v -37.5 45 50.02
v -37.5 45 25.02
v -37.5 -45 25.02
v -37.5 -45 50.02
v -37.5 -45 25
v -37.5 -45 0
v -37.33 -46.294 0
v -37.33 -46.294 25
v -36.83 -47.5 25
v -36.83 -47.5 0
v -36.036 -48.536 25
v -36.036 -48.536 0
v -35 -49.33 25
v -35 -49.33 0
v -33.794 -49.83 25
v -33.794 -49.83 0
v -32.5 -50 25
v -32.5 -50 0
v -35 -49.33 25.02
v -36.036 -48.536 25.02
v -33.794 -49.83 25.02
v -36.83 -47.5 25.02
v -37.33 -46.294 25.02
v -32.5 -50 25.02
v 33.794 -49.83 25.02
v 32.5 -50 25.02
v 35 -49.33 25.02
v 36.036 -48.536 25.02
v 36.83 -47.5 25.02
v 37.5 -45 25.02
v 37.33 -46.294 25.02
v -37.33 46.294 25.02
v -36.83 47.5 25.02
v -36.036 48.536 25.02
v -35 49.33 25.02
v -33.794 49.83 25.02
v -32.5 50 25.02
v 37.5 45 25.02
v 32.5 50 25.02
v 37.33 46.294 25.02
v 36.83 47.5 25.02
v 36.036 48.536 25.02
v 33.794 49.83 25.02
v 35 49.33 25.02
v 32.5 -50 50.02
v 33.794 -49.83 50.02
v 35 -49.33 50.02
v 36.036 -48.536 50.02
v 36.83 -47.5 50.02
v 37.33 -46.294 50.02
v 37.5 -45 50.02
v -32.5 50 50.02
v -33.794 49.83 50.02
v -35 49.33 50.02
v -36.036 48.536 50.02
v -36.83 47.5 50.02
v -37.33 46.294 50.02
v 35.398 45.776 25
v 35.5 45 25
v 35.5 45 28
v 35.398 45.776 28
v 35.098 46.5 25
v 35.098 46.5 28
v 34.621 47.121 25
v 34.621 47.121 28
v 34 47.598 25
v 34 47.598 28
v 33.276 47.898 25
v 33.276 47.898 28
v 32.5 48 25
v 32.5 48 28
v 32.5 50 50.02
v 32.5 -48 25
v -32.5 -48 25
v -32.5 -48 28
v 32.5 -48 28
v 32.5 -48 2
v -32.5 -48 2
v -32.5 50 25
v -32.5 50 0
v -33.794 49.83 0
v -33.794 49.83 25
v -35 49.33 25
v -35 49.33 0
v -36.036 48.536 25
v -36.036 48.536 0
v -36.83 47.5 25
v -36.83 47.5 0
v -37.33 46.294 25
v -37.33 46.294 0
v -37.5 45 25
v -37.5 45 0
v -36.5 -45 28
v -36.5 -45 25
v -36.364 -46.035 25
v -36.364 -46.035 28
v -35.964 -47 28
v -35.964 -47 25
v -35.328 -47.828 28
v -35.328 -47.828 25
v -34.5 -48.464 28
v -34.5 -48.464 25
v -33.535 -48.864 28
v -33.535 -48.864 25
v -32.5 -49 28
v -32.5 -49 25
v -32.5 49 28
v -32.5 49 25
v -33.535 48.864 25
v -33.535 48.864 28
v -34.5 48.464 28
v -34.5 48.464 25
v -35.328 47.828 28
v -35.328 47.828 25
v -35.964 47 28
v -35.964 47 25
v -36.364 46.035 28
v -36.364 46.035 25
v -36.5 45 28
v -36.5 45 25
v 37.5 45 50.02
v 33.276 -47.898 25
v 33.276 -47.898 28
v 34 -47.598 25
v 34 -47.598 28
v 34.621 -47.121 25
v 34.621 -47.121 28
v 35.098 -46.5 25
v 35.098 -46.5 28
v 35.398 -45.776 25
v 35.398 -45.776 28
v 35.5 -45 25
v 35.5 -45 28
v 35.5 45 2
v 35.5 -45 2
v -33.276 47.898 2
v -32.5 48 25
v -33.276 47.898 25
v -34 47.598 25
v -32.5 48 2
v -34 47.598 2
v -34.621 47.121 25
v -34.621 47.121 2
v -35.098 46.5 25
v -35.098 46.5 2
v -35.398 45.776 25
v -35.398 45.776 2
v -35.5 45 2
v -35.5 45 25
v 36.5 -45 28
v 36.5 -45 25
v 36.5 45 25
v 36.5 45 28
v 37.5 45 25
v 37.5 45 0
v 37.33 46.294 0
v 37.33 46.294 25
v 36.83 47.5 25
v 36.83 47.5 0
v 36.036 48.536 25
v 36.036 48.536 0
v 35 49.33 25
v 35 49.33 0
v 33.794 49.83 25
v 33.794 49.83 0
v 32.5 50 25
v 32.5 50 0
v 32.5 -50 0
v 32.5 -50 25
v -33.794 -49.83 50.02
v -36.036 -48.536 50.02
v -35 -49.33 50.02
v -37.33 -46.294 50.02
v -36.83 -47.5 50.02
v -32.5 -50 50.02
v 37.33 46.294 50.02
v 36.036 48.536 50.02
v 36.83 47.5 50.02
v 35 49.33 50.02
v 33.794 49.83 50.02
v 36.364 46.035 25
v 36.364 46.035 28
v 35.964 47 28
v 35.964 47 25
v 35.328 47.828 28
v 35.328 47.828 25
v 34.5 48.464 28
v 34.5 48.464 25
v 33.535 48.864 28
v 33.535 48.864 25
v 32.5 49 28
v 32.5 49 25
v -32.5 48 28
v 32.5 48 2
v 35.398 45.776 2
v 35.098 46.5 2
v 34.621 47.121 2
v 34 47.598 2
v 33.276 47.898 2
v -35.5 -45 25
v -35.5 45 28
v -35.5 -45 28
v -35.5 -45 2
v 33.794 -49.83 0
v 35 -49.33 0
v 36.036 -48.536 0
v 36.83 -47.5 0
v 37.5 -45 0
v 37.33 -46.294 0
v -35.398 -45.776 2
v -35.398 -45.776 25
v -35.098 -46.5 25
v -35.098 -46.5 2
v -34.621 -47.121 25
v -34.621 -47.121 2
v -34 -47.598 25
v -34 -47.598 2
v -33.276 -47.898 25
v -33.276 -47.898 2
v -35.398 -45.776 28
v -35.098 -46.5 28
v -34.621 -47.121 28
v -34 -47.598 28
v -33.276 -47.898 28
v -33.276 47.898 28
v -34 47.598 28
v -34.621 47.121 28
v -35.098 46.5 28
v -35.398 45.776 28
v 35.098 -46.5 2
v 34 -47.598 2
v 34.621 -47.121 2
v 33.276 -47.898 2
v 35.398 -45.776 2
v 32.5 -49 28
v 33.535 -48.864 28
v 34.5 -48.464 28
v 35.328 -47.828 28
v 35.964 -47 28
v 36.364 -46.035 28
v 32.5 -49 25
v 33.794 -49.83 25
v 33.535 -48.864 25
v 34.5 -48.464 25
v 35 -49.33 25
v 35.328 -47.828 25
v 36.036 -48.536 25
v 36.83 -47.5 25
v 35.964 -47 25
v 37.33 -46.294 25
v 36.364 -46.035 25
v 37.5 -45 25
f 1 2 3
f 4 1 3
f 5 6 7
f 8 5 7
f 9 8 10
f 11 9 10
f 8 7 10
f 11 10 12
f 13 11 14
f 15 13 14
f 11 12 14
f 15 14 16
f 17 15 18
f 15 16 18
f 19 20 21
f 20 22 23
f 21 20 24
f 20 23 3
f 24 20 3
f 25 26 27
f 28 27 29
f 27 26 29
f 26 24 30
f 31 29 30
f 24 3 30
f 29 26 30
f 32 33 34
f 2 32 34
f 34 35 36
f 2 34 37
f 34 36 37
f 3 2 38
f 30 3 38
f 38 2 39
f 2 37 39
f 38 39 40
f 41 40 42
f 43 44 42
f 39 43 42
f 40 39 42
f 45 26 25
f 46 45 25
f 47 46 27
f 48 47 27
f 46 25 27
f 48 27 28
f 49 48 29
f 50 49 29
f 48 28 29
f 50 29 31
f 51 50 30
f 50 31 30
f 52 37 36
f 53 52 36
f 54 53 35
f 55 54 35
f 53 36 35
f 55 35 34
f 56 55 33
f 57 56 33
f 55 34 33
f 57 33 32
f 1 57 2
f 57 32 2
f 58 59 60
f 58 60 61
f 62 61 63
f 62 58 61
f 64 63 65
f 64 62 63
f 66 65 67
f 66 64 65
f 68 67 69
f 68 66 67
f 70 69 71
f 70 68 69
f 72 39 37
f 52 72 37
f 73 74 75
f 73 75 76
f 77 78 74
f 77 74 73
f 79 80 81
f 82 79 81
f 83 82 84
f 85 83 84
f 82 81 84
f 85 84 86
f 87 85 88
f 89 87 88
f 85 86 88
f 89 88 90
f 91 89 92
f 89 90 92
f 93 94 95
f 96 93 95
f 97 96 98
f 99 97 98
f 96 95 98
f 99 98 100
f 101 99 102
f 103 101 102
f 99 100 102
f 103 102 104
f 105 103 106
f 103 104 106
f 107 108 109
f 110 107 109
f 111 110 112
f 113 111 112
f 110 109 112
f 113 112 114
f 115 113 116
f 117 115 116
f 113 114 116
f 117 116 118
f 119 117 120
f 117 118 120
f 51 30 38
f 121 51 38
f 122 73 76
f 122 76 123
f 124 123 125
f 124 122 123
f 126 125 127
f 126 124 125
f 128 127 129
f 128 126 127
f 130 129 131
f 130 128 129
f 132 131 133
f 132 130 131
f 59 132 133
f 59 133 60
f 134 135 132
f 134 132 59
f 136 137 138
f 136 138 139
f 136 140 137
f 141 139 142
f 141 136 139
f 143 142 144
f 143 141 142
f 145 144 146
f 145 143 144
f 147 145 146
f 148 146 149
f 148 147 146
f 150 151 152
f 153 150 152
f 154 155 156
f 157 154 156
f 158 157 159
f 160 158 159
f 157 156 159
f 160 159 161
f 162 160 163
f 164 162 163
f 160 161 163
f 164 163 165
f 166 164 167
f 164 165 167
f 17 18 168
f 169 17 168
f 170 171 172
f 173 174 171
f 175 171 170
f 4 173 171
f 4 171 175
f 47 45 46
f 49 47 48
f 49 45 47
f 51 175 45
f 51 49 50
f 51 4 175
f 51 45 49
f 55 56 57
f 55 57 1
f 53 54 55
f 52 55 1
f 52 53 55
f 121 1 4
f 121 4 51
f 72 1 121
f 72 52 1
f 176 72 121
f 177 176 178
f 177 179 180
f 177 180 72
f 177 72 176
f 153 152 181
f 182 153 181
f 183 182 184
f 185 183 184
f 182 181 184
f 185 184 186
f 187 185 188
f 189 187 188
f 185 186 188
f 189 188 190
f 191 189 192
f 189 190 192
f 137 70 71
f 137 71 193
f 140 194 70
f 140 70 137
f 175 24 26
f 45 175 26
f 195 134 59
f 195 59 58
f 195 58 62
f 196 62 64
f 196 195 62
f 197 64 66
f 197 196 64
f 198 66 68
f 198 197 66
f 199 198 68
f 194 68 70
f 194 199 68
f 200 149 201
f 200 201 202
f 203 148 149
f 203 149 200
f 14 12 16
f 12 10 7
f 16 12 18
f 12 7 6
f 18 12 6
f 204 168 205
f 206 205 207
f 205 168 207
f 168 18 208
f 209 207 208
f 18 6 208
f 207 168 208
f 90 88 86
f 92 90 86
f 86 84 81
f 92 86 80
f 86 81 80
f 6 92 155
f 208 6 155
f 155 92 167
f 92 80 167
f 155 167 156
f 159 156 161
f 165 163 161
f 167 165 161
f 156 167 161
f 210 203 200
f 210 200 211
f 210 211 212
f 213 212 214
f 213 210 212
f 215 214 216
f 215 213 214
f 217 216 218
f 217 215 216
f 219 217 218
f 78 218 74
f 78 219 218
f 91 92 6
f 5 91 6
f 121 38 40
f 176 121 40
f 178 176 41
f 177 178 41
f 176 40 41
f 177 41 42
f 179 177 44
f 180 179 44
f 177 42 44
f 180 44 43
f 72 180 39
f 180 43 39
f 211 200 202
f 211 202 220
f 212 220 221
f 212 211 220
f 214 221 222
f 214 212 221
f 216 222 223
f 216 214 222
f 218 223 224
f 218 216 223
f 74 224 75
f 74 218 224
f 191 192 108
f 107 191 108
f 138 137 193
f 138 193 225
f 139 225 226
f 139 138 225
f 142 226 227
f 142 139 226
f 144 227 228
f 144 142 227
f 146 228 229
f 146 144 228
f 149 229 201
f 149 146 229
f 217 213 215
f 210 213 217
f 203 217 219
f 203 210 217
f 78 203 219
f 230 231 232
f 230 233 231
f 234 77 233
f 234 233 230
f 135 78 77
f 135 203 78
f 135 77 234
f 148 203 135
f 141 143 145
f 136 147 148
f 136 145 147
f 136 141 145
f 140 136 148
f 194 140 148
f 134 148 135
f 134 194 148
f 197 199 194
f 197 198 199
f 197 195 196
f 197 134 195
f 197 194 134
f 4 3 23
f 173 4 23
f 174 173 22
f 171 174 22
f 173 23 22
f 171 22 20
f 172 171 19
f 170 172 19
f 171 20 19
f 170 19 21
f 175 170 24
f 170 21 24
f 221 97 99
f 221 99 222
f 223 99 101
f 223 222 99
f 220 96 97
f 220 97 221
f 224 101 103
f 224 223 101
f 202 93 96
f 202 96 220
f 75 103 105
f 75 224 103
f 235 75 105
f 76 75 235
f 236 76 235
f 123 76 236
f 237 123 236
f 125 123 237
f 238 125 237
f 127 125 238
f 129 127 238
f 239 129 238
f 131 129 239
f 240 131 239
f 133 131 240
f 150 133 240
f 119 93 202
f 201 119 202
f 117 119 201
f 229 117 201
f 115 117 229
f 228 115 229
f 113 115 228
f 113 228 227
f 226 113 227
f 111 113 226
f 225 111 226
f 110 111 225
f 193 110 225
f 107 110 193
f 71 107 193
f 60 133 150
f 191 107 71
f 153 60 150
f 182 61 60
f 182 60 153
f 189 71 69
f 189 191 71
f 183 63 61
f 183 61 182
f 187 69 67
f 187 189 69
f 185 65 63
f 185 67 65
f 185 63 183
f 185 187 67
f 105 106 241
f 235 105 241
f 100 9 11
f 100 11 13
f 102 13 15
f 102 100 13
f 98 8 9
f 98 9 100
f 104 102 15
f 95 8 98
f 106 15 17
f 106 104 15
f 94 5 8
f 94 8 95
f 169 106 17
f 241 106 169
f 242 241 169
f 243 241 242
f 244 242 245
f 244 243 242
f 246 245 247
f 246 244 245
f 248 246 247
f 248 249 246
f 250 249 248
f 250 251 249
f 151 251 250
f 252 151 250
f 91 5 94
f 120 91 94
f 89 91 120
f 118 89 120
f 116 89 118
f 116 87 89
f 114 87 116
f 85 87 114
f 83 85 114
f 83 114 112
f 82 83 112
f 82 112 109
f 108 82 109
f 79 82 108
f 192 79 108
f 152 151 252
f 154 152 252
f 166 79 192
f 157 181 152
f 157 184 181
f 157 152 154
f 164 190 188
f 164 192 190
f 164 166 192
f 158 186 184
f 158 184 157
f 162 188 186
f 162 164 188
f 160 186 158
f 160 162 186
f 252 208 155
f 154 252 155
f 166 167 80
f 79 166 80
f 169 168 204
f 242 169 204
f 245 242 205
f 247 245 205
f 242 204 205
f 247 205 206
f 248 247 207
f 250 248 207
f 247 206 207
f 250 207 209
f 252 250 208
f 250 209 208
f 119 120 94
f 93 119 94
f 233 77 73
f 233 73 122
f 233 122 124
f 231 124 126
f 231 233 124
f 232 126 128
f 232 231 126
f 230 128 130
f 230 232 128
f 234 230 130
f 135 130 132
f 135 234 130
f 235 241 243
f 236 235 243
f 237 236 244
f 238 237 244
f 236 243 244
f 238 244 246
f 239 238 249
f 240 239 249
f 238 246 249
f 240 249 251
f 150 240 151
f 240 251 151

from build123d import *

# Parameters (mm, degrees)
PAD_DEPTH    = 25
THICKNESS_T  = -2
PAD001_DEPTH = 3
PAD002_DEPTH = 25
POCKET_DEPTH = 3


with BuildPart() as body:
    # Sketch → Pad (new body)
    with BuildSketch(Plane.XY):
        with BuildLine():
            Line((-37.5, 45), (-37.5, -45))
            ThreePointArc((-37.5, -45), (-36.035534, -48.535534), (-32.5, -50))
            Line((-32.5, -50), (32.5, -50))
            ThreePointArc((32.5, -50), (36.035534, -48.535534), (37.5, -45))
            Line((37.5, -45), (37.5, 45))
            ThreePointArc((37.5, 45), (36.035534, 48.535534), (32.5, 50))
            Line((32.5, 50), (-32.5, 50))
            ThreePointArc((-32.5, 50), (-36.035534, 48.535534), (-37.5, 45))
        make_face()
    extrude(amount=PAD_DEPTH)

    # Thickness
    thickness_openings = [body.faces().sort_by_distance(p)[0] for p in [
        (0, 0, 25),
    ]]
    offset(amount=THICKNESS_T, openings=thickness_openings)

    # Sketch001 (on Face10 of Thickness) → Pad001 (join)
    with BuildSketch(Plane.XY.offset(25)):
        with BuildLine():
            Line((-36.5, 45), (-36.5, -45))
            ThreePointArc((-36.5, -45), (-35.328427, -47.828427), (-32.5, -49))
            Line((-32.5, -49), (32.5, -49))
            ThreePointArc((32.5, -49), (35.328427, -47.828427), (36.5, -45))
            Line((36.5, -45), (36.5, 45))
            ThreePointArc((36.5, 45), (35.328427, 47.828427), (32.5, 49))
            Line((32.5, 49), (-32.5, 49))
            ThreePointArc((-32.5, 49), (-35.328427, 47.828427), (-36.5, 45))
        make_face()
        with BuildLine():
            Line((-35.5, 45), (-35.5, -45))
            ThreePointArc((-35.5, -45), (-34.62132, -47.12132), (-32.5, -48))
            Line((-32.5, -48), (32.5, -48))
            ThreePointArc((32.5, -48), (34.62132, -47.12132), (35.5, -45))
            Line((35.5, -45), (35.5, 45))
            ThreePointArc((35.5, 45), (34.62132, 47.12132), (32.5, 48))
            Line((32.5, 48), (-32.5, 48))
            ThreePointArc((-32.5, 48), (-34.62132, 47.12132), (-35.5, 45))
        make_face(mode=Mode.SUBTRACT)
    extrude(amount=PAD001_DEPTH)


with BuildPart() as lid:
    # Sketch002 → Pad002 (new body)
    with BuildSketch(Plane.XY.offset(25.02)):
        with BuildLine():
            Line((-37.5, 45), (-37.5, -45))
            ThreePointArc((-37.5, -45), (-36.035534, -48.535534), (-32.5, -50))
            Line((-32.5, -50), (32.5, -50))
            ThreePointArc((32.5, -50), (36.035534, -48.535534), (37.5, -45))
            Line((37.5, -45), (37.5, 45))
            ThreePointArc((37.5, 45), (36.035534, 48.535534), (32.5, 50))
            Line((32.5, 50), (-32.5, 50))
            ThreePointArc((-32.5, 50), (-36.035534, 48.535534), (-37.5, 45))
        make_face()
    extrude(amount=PAD002_DEPTH)

    # Sketch003 (on Face4 of Binder) → Pocket (cut)
    with BuildSketch(Plane(origin=(0, 0, 0), x_dir=(1, 0, 0), z_dir=(0, 0, -1))):
        with BuildLine():
            Line((-36.6, 45), (-36.6, -45))
            ThreePointArc((-36.6, -45), (-35.399138, -47.899138), (-32.5, -49.1))
            Line((-32.5, -49.1), (32.5, -49.1))
            ThreePointArc((32.5, -49.1), (35.399138, -47.899138), (36.6, -45))
            Line((36.6, -45), (36.6, 45))
            ThreePointArc((36.6, 45), (35.399138, 47.899138), (32.5, 49.1))
            Line((32.5, 49.1), (-32.5, 49.1))
            ThreePointArc((-32.5, 49.1), (-35.399138, 47.899138), (-36.6, 45))
        make_face()
        with BuildLine():
            Line((-35.4, 45), (-35.4, -45))
            ThreePointArc((-35.4, -45), (-34.55061, -47.05061), (-32.5, -47.9))
            Line((-32.5, -47.9), (32.5, -47.9))
            ThreePointArc((32.5, -47.9), (34.55061, -47.05061), (35.4, -45))
            Line((35.4, -45), (35.4, 45))
            ThreePointArc((35.4, 45), (34.55061, 47.05061), (32.5, 47.9))
            Line((32.5, 47.9), (-32.5, 47.9))
            ThreePointArc((-32.5, 47.9), (-34.55061, 47.05061), (-35.4, 45))
        make_face(mode=Mode.SUBTRACT)
    extrude(amount=-POCKET_DEPTH, mode=Mode.SUBTRACT)


solid = Compound([body.part, lid.part])
